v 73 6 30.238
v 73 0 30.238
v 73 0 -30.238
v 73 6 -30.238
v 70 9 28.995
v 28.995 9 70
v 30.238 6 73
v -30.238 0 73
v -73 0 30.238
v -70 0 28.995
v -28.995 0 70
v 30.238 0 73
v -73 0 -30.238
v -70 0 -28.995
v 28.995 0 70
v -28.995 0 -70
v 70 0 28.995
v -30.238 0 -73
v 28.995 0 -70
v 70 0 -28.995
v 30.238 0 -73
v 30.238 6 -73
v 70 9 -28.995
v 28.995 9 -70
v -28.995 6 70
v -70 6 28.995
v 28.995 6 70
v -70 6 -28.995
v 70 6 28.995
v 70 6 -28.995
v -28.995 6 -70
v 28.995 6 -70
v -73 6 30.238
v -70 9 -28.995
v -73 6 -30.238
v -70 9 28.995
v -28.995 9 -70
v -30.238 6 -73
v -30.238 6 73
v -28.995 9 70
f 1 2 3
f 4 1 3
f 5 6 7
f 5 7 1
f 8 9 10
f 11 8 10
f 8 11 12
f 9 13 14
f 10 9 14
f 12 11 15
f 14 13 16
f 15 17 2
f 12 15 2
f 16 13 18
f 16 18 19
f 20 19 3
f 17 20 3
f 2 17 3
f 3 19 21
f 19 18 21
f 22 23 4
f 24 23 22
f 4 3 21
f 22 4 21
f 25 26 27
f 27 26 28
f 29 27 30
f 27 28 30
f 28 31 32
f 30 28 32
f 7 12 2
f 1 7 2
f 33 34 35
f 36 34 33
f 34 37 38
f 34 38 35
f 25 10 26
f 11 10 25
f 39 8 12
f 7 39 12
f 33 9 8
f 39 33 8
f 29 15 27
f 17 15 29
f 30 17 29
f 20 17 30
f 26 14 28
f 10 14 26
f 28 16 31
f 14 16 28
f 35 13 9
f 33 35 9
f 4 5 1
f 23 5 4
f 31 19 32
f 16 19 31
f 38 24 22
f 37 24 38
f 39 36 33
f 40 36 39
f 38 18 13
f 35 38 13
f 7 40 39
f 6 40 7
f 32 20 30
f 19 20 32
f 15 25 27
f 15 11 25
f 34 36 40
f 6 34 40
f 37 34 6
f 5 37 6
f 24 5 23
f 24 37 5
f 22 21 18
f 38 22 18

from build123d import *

# Parameters (mm, degrees)
RESSALTO_EXTRUS_O2_DEPTH = 9
CASCA1_T                 = -3
CHANFRO1_SIZE            = 3


with BuildPart() as part:
    # Esboço1 → Ressalto-extrusão2 (new body)
    with BuildSketch(Plane(origin=(0, 0, 0), x_dir=(1, 0, 0), z_dir=(0, 1, 0))):
        Polygon((30.237590053, -73), (73, -30.237590053), (73, 30.237590053), (30.237590053, 73), (-30.237590053, 73), (-73, 30.237590053), (-73, -30.237590053), (-30.237590053, -73), align=None)
    extrude(amount=RESSALTO_EXTRUS_O2_DEPTH)

    # Casca1
    casca1_openings = [part.faces().sort_by_distance(p)[0] for p in [
        (0, 0, 0),
    ]]
    offset(amount=CASCA1_T, openings=casca1_openings, kind=Kind.INTERSECTION)

    # Chanfro1
    chanfro1_edges = [part.edges().sort_by_distance(p)[0] for p in [
        (73, 9, 0),
        (51.618795027, 9, -51.618795027),
        (0, 9, -73),
        (-51.618795027, 9, -51.618795027),
        (-73, 9, 0),
        (-51.618795027, 9, 51.618795027),
        (0, 9, 73),
        (51.618795027, 9, 51.618795027),
    ]]
    chamfer(chanfro1_edges, length=CHANFRO1_SIZE)


solid = part.part
